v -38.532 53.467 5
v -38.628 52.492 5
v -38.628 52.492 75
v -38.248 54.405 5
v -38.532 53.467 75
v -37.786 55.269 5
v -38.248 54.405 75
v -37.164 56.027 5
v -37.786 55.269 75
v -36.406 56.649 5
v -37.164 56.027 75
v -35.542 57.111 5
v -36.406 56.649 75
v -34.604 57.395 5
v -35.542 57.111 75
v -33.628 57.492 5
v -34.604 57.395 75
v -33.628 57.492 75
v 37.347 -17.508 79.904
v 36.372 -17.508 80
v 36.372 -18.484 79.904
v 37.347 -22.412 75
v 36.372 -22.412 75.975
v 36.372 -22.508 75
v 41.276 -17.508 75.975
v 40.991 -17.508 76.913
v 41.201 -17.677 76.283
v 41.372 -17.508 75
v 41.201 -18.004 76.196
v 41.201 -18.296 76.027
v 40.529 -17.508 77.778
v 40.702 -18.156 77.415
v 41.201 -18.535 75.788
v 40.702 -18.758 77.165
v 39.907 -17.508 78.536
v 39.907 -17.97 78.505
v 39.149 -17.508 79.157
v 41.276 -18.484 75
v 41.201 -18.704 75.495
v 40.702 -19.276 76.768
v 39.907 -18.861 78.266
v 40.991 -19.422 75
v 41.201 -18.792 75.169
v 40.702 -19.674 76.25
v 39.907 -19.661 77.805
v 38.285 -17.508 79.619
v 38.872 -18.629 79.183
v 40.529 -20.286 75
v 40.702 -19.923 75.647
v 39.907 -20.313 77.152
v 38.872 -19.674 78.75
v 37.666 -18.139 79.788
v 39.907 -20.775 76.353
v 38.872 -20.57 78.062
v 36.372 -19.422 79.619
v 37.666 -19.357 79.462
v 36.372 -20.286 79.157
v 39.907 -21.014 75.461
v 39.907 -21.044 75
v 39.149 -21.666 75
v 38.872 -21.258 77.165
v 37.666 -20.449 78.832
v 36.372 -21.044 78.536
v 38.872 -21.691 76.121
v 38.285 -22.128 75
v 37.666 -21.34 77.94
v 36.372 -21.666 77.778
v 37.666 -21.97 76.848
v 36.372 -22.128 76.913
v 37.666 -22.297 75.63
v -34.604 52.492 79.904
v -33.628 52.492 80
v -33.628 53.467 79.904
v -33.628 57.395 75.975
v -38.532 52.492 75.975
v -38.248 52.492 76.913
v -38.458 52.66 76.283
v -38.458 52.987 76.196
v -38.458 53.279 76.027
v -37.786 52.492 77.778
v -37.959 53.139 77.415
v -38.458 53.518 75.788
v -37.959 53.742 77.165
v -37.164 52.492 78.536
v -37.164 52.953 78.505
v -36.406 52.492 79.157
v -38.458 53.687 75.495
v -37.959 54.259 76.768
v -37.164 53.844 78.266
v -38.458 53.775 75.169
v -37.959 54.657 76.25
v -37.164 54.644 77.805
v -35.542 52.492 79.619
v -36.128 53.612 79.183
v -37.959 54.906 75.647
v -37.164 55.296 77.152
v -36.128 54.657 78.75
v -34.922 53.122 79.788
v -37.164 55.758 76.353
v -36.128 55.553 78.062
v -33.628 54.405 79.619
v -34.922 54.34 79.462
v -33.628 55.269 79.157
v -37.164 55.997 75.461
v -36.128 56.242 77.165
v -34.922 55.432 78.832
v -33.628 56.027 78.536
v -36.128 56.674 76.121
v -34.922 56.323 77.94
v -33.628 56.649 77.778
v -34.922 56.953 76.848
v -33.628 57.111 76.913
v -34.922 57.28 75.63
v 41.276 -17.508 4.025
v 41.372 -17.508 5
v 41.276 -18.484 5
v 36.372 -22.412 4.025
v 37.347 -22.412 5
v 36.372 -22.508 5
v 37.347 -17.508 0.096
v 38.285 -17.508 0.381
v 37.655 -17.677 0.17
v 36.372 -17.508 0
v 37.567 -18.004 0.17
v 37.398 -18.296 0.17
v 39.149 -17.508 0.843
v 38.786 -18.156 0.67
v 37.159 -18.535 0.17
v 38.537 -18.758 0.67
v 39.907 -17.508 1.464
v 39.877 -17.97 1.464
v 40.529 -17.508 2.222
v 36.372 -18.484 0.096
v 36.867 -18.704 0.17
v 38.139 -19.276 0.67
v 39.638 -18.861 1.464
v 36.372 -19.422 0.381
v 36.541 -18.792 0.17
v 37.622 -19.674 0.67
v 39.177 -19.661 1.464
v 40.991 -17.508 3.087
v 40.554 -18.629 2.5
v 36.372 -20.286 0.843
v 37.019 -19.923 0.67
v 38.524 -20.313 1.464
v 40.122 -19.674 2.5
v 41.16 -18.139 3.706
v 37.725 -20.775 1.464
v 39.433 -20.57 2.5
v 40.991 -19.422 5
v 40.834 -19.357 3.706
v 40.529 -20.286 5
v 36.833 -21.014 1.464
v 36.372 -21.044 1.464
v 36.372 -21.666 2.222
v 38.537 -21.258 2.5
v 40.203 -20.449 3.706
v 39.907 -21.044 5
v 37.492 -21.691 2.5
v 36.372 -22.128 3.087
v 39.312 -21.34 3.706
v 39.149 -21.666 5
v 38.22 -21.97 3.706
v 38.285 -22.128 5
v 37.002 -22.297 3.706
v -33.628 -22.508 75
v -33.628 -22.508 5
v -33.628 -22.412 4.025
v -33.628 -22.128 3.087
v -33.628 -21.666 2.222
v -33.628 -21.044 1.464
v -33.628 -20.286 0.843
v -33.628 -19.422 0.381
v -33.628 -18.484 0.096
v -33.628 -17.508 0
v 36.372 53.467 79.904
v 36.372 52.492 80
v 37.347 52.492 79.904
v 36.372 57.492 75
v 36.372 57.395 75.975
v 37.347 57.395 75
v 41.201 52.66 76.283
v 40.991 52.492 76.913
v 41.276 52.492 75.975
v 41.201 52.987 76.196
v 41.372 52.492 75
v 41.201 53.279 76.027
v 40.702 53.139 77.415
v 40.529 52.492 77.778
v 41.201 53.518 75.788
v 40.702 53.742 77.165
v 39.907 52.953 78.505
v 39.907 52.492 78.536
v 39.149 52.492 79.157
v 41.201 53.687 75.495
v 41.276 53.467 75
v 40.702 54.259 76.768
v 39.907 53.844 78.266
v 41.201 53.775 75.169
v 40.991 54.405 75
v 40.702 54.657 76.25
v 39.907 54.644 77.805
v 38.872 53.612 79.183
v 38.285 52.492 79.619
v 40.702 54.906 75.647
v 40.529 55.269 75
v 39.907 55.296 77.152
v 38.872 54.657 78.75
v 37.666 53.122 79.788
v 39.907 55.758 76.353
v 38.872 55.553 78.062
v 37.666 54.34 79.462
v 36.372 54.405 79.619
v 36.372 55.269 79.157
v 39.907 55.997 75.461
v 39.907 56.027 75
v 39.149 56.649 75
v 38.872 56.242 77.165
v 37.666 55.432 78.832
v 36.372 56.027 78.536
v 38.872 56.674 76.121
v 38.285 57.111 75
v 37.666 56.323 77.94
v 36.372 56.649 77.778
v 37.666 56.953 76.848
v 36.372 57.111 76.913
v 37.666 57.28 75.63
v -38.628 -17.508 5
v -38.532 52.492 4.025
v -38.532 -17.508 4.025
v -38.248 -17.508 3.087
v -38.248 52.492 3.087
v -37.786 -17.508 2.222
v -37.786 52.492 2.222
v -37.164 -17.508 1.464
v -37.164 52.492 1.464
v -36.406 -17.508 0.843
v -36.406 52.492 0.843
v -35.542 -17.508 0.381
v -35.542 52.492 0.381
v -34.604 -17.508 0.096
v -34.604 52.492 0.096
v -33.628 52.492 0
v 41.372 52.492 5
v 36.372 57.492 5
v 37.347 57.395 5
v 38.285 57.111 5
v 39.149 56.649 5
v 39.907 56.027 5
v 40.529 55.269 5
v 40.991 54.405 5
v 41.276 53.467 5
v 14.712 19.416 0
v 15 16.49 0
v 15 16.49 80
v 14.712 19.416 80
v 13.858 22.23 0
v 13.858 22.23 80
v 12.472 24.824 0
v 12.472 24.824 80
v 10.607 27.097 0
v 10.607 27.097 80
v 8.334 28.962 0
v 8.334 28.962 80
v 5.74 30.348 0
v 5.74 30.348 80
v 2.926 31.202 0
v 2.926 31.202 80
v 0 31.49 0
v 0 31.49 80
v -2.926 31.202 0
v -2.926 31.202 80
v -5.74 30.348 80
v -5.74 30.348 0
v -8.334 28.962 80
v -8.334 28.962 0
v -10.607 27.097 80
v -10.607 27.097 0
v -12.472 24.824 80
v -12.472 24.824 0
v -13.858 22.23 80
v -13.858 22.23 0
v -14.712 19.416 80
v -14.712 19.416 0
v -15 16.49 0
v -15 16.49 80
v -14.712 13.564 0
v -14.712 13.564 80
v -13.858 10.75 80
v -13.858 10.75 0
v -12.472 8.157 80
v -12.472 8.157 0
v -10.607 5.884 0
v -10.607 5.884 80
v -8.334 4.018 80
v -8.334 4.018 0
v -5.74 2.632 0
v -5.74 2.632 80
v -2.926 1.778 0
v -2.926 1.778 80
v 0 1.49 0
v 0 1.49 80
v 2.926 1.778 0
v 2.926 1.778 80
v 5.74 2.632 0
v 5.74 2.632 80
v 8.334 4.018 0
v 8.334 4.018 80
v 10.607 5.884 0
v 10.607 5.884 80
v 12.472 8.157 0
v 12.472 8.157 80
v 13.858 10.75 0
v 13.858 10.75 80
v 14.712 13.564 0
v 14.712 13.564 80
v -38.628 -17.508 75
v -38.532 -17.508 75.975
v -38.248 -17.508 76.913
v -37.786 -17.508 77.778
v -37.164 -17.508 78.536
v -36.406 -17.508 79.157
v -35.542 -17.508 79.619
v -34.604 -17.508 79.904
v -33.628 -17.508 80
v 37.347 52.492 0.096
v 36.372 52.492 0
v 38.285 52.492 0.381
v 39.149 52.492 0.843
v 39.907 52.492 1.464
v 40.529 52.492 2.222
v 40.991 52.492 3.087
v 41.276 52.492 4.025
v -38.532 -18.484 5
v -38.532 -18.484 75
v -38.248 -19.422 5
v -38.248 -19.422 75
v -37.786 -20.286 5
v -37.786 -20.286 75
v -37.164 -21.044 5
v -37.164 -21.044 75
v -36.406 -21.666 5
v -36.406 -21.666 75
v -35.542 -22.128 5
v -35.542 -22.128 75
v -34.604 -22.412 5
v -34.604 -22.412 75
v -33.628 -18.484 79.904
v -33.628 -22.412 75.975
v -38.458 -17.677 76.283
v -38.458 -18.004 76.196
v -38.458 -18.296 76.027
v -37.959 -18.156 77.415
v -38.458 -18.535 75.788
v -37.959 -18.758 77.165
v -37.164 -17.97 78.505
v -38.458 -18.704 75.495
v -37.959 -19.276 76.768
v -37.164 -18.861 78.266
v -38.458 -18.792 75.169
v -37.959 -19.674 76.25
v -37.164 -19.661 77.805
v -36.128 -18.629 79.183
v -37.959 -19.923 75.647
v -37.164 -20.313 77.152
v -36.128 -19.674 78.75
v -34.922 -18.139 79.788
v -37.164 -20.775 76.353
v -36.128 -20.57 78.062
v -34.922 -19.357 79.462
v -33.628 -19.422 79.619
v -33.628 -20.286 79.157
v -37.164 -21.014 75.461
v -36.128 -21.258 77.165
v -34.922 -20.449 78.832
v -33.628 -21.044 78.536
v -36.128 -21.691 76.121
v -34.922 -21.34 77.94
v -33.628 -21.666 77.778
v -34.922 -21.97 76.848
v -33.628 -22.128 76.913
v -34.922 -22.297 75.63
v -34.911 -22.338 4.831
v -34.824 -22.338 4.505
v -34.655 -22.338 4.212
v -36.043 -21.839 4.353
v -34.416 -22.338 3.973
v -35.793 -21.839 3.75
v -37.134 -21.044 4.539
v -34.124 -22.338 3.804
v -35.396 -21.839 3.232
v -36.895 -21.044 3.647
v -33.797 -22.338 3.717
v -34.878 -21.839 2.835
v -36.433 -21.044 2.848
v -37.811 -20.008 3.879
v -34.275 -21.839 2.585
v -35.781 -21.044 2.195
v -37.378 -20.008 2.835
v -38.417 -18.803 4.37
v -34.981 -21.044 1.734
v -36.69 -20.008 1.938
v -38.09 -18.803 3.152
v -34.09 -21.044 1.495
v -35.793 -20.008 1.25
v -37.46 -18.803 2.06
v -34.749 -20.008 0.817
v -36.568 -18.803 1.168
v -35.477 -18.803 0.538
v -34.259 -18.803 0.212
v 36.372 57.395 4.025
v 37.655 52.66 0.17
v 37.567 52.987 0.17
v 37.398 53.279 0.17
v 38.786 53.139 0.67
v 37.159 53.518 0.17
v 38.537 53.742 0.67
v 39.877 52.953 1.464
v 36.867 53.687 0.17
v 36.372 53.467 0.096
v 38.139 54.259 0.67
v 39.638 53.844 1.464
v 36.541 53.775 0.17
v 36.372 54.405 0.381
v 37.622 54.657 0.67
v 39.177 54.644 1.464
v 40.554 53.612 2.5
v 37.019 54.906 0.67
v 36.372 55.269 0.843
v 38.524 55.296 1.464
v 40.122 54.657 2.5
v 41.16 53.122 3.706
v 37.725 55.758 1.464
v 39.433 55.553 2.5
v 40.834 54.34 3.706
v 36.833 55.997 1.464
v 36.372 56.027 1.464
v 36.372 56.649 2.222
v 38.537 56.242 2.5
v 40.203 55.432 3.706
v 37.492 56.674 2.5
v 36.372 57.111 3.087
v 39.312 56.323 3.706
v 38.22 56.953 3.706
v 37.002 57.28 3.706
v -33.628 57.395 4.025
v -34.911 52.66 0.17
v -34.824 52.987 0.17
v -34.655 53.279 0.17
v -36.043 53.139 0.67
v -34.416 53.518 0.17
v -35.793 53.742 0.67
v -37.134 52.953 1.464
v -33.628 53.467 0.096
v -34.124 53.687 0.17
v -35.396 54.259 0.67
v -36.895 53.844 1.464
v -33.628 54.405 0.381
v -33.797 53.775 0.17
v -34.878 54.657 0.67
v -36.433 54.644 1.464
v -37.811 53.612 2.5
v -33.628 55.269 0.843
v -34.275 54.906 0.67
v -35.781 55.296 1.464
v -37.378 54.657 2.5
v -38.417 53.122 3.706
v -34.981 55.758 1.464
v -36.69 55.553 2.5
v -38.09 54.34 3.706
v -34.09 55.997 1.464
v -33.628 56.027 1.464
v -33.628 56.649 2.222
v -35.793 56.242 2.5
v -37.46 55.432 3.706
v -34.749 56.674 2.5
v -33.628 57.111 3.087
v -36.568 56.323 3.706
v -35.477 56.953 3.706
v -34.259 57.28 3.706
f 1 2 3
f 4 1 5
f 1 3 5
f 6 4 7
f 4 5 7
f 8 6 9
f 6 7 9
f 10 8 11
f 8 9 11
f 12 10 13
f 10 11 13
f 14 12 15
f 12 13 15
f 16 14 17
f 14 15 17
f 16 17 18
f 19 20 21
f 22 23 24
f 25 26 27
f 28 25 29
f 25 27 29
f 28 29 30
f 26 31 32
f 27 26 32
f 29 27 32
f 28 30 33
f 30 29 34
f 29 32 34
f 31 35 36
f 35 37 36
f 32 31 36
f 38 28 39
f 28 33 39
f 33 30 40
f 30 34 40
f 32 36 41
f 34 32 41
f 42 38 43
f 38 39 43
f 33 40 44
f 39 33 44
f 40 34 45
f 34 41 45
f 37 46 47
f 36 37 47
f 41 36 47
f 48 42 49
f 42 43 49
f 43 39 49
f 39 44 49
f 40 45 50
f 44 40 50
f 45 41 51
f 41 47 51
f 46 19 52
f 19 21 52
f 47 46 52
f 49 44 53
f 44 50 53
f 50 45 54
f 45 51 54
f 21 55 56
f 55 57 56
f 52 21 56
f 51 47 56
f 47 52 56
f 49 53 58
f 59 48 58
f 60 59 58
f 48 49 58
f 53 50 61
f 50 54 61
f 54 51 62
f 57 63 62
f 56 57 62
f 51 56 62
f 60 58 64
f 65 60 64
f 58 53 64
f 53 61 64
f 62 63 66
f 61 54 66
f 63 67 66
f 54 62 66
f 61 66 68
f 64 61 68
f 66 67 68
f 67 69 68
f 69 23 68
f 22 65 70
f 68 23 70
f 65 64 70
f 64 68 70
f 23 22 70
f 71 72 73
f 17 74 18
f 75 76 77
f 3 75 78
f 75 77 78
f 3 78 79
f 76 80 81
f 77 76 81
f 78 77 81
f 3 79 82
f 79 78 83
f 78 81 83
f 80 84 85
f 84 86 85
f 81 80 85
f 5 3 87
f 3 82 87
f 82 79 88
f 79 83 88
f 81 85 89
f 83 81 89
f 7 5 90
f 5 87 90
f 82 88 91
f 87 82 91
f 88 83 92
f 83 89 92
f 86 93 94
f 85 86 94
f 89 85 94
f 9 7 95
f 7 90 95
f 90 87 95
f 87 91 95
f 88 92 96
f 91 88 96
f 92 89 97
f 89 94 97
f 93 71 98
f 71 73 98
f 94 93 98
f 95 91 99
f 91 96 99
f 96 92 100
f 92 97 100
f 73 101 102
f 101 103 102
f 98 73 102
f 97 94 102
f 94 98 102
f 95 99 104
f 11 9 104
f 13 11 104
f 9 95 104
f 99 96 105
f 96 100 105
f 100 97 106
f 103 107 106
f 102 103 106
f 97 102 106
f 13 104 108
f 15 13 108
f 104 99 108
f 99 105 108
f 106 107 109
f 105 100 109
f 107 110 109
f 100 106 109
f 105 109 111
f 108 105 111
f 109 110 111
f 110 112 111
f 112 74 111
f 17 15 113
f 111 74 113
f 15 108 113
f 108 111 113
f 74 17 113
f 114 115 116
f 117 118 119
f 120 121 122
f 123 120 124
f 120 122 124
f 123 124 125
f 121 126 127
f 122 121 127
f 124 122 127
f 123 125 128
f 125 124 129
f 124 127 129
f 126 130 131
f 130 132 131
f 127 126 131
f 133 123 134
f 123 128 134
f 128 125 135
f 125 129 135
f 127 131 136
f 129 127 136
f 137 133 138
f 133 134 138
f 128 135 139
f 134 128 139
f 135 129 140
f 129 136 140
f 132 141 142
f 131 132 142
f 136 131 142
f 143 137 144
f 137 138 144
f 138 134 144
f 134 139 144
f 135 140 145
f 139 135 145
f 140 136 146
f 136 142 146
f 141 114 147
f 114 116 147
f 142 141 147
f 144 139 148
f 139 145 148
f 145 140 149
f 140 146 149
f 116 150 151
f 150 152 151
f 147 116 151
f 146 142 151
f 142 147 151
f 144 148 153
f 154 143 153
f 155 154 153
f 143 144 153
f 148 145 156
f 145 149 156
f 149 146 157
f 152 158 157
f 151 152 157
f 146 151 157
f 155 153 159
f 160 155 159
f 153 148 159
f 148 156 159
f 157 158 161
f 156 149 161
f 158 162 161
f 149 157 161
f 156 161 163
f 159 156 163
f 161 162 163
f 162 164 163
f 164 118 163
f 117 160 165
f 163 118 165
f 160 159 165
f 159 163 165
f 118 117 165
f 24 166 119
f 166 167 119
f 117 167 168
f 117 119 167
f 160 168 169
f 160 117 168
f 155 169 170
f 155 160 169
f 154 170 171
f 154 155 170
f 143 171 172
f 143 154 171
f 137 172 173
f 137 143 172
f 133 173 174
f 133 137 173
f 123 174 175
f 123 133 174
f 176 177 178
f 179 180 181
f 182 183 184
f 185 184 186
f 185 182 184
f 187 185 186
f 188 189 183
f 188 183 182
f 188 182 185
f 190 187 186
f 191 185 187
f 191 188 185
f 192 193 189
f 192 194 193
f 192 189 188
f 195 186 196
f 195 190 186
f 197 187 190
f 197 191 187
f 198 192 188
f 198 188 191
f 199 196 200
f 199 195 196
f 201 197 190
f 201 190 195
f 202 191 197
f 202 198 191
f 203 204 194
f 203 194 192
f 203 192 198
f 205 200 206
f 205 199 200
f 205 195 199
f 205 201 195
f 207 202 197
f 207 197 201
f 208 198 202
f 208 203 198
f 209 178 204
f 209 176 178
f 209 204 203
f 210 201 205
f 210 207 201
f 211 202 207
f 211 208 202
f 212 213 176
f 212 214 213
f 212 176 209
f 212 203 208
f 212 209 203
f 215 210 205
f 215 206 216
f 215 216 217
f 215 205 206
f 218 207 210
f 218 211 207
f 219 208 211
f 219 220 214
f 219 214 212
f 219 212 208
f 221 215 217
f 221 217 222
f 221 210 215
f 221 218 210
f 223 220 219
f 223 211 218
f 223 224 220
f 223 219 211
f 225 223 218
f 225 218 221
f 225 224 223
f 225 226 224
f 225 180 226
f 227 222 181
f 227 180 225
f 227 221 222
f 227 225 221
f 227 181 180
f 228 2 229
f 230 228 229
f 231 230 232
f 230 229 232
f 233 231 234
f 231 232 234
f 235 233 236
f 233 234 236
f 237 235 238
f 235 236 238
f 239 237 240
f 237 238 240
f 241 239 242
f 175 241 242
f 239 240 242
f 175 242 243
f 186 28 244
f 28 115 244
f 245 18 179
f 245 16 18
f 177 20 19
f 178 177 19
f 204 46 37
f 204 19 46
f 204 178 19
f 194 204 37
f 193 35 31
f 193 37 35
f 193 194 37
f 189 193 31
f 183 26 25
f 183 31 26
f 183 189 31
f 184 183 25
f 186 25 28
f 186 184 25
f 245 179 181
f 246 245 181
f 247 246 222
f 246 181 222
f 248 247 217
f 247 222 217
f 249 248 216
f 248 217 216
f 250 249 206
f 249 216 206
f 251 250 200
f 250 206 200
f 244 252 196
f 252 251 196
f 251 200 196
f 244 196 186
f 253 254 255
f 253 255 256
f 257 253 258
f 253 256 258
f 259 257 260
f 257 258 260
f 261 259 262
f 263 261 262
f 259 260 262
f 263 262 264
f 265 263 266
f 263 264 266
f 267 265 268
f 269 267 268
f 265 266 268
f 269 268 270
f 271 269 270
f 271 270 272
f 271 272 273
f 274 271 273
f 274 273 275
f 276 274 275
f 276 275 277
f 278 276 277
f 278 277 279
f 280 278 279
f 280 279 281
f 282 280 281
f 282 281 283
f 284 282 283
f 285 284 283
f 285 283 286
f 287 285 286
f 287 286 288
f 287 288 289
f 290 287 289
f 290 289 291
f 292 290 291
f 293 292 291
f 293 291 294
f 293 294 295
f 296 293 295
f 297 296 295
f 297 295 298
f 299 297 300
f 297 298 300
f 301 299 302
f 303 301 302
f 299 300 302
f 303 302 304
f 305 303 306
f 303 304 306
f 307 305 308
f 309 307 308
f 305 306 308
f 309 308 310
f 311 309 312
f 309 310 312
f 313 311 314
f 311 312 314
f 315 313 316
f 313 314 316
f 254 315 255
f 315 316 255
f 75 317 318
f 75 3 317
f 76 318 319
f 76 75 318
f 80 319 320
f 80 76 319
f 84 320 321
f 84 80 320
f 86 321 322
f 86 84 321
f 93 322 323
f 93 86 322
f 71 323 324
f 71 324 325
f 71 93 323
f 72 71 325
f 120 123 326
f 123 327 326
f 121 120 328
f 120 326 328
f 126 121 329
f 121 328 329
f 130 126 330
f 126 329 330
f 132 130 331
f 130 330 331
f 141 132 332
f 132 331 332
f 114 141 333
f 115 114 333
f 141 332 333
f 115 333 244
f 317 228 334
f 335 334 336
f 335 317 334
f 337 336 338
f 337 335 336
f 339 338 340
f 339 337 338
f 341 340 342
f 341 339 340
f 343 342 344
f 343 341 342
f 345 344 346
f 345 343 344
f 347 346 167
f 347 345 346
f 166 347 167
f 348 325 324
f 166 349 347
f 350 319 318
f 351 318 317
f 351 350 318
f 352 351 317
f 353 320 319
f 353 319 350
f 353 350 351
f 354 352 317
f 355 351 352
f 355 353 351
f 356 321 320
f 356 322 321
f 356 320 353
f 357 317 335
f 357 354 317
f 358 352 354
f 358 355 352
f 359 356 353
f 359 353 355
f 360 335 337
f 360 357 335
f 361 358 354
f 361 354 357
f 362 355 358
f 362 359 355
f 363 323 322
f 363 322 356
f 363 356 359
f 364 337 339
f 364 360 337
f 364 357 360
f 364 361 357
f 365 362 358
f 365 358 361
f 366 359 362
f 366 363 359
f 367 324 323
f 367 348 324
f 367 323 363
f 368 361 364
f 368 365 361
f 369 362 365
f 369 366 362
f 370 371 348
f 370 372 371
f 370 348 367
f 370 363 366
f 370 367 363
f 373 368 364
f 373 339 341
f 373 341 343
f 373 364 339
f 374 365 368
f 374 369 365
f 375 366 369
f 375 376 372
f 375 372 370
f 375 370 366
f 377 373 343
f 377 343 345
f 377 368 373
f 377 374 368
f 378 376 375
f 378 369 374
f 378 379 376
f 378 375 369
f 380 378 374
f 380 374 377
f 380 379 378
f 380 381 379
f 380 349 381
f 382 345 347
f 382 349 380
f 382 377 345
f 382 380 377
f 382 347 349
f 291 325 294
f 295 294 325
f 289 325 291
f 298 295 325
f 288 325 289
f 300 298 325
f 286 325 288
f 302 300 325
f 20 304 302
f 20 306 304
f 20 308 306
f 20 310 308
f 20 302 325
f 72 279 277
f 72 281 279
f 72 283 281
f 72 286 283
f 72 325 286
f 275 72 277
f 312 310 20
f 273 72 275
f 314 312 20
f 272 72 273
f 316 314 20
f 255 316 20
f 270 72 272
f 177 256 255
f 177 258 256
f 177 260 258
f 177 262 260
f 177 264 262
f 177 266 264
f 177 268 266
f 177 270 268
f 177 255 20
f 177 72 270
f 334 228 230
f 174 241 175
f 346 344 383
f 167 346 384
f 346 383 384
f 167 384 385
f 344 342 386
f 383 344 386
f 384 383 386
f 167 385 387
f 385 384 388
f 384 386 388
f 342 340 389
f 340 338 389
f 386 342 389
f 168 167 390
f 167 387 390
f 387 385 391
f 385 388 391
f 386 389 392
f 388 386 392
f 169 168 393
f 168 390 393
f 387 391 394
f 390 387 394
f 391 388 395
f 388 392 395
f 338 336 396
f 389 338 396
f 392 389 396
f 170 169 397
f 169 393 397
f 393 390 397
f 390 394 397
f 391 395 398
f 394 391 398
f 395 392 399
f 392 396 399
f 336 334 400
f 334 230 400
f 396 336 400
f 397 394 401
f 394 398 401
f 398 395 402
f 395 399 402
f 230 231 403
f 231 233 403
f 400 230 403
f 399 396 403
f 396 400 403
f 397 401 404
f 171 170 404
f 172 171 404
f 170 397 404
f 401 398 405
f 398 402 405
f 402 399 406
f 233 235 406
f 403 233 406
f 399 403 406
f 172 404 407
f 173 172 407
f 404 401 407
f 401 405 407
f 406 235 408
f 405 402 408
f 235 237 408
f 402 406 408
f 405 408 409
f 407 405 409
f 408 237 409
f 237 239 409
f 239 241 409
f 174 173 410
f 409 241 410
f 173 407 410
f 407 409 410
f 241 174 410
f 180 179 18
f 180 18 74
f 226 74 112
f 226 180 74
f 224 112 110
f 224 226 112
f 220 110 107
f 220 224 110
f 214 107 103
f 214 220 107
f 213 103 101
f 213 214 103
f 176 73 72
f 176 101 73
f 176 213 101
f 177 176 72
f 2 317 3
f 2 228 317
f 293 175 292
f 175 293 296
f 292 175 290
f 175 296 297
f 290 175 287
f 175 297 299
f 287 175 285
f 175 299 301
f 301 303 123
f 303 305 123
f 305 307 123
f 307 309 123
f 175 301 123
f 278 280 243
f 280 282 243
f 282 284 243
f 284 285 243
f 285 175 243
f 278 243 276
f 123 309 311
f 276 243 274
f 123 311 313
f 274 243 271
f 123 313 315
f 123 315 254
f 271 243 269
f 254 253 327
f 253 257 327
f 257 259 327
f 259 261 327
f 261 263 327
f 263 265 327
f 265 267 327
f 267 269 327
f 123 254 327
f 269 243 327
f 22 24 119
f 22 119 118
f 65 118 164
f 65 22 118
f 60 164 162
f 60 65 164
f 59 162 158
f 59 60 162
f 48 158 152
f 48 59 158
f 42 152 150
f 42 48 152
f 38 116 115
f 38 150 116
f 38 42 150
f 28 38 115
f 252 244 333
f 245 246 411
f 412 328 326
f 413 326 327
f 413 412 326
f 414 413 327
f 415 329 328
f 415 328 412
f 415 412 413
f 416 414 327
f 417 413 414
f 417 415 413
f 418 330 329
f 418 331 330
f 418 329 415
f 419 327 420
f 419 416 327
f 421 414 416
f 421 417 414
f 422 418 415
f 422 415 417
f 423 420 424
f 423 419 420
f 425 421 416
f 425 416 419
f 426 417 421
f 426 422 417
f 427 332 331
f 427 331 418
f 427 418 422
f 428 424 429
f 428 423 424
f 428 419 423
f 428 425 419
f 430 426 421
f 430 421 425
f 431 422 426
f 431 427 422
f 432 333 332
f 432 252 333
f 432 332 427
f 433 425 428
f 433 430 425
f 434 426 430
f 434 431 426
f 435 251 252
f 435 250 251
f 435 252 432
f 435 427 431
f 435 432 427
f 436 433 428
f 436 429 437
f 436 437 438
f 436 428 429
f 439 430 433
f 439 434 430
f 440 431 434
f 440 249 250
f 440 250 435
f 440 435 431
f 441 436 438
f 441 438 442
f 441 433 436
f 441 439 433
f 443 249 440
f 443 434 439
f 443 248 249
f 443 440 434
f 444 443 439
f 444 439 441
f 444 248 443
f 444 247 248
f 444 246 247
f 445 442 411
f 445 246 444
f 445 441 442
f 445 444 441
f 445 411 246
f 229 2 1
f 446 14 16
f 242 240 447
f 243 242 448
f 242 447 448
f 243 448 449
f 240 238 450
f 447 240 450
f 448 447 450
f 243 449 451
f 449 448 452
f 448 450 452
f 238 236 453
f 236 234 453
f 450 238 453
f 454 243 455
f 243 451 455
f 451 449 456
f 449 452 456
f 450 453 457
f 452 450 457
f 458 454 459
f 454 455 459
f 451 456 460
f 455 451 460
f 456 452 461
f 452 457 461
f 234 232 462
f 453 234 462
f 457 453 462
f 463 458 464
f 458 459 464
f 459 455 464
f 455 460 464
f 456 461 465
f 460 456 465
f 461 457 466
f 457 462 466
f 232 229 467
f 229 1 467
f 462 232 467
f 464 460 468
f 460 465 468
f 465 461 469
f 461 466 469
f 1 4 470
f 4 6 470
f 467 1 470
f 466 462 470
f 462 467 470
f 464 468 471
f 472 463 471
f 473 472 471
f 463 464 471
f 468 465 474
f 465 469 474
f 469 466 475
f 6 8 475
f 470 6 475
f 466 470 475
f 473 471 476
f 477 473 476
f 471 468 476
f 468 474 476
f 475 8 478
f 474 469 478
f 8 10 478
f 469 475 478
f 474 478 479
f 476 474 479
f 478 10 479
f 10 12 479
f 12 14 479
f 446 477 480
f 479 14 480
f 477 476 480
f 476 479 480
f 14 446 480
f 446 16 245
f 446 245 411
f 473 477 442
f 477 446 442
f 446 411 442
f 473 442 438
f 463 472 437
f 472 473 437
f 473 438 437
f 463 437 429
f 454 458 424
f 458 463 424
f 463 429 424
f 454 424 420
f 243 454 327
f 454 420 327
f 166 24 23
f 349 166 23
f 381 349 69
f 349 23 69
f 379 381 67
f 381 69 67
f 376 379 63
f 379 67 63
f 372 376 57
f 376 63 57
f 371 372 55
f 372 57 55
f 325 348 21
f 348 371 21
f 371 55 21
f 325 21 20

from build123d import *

# Parameters (mm, degrees)
F0_W     = 80
F0_H     = 80
F1_DEPTH = 80
F2_R     = 15
F3_DEPTH = 80.001
F4_R     = 5


with BuildPart() as f1:
    # F0 (on Top) → F1 (new body)
    with BuildSketch(Plane.XY):
        with Locations((1.3716, 17.491502)):
            Rectangle(F0_W, F0_H)
    extrude(amount=F1_DEPTH)

    # F2 (on face) → F3 (cut, through all)
    with BuildSketch(Plane.XY.offset(80)):
        with Locations((0, 16.490143)):
            Circle(F2_R)
    extrude(amount=-F3_DEPTH, mode=Mode.SUBTRACT)

    # F4
    f4_edges = [f1.edges().sort_by_distance(p)[0] for p in [
        (1.3716, 57.491502, 80),
        (1.3716, -22.508498, 80),
        (-38.6284, 17.491502, 80),
        (41.3716, 17.491502, 80),
        (41.3716, 57.491502, 40),
        (41.3716, -22.508498, 40),
        (41.3716, 17.491502, 0),
        (-38.6284, 57.491502, 40),
        (-38.6284, 17.491502, 0),
        (-38.6284, -22.508498, 40),
        (1.3716, 57.491502, 0),
        (1.3716, -22.508498, 0),
    ]]
    fillet(f4_edges, radius=F4_R)


solid = f1.part
